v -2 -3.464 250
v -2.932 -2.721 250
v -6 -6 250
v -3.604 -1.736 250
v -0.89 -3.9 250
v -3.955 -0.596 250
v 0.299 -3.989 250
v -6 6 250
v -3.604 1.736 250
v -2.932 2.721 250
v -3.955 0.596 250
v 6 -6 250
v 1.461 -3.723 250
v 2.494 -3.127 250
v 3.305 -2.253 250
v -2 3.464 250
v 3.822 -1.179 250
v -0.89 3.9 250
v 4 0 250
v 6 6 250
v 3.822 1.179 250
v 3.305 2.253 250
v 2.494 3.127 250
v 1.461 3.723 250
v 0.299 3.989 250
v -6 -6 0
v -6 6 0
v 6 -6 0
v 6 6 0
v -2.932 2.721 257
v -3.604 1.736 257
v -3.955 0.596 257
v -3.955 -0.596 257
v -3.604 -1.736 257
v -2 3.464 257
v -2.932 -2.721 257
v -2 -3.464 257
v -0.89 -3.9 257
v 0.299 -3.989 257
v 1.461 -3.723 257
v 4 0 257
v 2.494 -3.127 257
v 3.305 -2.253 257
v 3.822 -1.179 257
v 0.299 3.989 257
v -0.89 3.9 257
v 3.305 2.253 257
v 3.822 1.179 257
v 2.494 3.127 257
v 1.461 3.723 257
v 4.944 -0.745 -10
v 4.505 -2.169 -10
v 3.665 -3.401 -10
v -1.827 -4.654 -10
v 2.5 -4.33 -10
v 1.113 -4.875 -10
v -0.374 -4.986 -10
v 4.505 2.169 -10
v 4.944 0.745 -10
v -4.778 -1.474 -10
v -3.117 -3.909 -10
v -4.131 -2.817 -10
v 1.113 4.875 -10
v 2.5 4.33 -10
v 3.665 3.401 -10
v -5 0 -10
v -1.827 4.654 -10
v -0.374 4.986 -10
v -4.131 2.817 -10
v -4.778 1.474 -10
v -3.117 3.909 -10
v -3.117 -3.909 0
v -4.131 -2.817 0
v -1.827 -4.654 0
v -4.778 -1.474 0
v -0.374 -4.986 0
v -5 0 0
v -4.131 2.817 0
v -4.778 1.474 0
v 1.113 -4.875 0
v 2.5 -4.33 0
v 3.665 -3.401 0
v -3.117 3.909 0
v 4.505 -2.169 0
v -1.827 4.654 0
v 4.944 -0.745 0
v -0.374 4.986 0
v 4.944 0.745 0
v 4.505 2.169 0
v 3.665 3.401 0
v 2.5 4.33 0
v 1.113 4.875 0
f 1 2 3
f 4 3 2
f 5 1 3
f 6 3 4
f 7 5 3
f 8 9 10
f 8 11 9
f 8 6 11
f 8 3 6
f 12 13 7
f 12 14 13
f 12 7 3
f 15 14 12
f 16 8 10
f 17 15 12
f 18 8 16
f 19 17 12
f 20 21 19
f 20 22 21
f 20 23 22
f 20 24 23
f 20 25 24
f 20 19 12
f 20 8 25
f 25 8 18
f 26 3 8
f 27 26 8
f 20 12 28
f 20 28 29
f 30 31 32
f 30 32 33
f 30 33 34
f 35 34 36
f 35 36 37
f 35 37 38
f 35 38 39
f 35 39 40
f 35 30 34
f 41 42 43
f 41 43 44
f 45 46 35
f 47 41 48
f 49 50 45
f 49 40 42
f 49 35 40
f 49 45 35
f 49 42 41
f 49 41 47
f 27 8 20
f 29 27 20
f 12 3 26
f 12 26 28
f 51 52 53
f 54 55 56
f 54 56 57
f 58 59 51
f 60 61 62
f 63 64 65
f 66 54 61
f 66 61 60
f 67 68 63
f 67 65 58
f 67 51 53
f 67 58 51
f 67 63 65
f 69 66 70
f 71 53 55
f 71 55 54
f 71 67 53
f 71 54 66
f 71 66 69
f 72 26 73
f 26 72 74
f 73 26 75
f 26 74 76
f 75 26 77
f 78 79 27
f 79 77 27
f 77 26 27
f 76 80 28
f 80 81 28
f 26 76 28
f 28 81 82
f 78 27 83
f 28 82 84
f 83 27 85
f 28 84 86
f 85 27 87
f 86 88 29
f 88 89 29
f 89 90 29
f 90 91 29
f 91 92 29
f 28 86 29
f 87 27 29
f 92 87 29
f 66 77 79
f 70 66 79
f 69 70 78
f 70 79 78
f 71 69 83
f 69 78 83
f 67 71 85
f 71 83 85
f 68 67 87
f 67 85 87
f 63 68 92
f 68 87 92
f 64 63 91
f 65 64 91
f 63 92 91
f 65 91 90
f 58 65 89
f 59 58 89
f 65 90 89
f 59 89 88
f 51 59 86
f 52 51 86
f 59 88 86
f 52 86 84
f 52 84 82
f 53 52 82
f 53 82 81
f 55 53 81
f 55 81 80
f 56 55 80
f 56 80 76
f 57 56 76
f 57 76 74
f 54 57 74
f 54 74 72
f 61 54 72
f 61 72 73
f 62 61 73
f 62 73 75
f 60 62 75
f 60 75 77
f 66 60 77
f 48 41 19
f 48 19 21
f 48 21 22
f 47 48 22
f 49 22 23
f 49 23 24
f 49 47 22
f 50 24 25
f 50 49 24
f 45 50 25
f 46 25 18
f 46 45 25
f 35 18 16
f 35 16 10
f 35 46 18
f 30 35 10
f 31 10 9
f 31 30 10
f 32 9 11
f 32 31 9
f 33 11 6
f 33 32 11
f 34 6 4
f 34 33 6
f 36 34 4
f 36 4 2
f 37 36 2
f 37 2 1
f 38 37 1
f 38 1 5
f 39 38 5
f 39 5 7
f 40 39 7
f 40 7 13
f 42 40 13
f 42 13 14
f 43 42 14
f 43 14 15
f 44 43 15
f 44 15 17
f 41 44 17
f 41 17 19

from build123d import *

# Parameters (mm, degrees)
EXTRUDE_1_DEPTH     = 250
SKETCH_2_R          = 2.5
EXTRUDE_2_DEPTH     = 10
SKETCH_3_R          = 5
EXTRUDE_3_DEPTH     = 10
SKETCH_4_W          = 2
SKETCH_4_H          = 1.835573614
CUT_EXTRUDE_1_DEPTH = 10
EXTRUDE_START       = -5
SKETCH_6_R          = 2.5
EXTRUDE_5_DEPTH     = 5
SKETCH_9_R          = 2.5
EXTRUDE_7_DEPTH     = 5
SKETCH_10_R         = 2.5
CUT_EXTRUDE_3_DEPTH = 3
CUT_EXTRUDE_START   = -3
SKETCH_11_R         = 2.5
CUT_EXTRUDE_4_DEPTH = 3
EXTRUDE_START_2     = -10
SKETCH_12_R         = 5
EXTRUDE_8_DEPTH     = 10
SKETCH_14_R         = 2.5
EXTRUDE_10_DEPTH    = 1
SKETCH_15_W         = 12
SKETCH_15_H         = 12
EXTRUDE_11_DEPTH    = 250
SKETCH_16_R         = 4
EXTRUDE_12_DEPTH    = 20


with BuildPart() as part:
    # 草图1 → 凸台-拉伸1 (new body)
    with BuildSketch(Plane.XY):
        Polygon((5, 0), (2.5, 4.330127019), (-2.5, 4.330127019), (-5, 0), (-2.5, -4.330127019), (2.5, -4.330127019), align=None)
    extrude(amount=EXTRUDE_1_DEPTH)

    # 草图2 → 凸台-拉伸2 (add)
    with BuildSketch(Plane.XY.offset(250)):
        Circle(SKETCH_2_R)
    extrude(amount=EXTRUDE_2_DEPTH)

    # 草图3 → 凸台-拉伸3 (add)
    with BuildSketch(Plane(origin=(0, 0, 0), x_dir=(-1, 0, 0), z_dir=(0, 0, -1))):
        Circle(SKETCH_3_R)
    extrude(amount=EXTRUDE_3_DEPTH)

    # 草图4 → 切除-拉伸1 (cut)
    with BuildSketch(Plane.XY.offset(260)):
        with Locations((0, 2.417786807)):
            Rectangle(SKETCH_4_W, SKETCH_4_H)
    extrude(amount=-CUT_EXTRUDE_1_DEPTH, mode=Mode.SUBTRACT)

    # 草图6 → 凸台-拉伸5 (add)
    with BuildSketch(Plane.XY.offset(260).offset(EXTRUDE_START)):
        with Locations(Location((0, 0, 0), (0, 0, 113.578178478))):
            Circle(SKETCH_6_R)
    extrude(amount=EXTRUDE_5_DEPTH)

    # 草图9 → 凸台-拉伸7 (add)
    with BuildSketch(Plane(origin=(0, 0, -10), x_dir=(-1, 0, 0), z_dir=(0, 0, -1))):
        with Locations(Location((0, 0, 0), (0, 0, 66.421821522))):
            Circle(SKETCH_9_R)
    extrude(amount=-EXTRUDE_7_DEPTH)

    # 草图10 → 切除-拉伸3 (cut)
    with BuildSketch(Plane(origin=(0, 0, -10), x_dir=(-1, 0, 0), z_dir=(0, 0, -1))):
        with Locations(Location((0, 0, 0), (0, 0, 66.421821522))):
            Circle(SKETCH_10_R)
    extrude(amount=-CUT_EXTRUDE_3_DEPTH, mode=Mode.SUBTRACT)

    # 草图11 → 切除-拉伸4 (cut)
    with BuildSketch(Plane.XY.offset(260).offset(CUT_EXTRUDE_START)):
        with Locations(Location((0, 0, 0), (0, 0, 113.578178478))):
            Circle(SKETCH_11_R)
    extrude(amount=CUT_EXTRUDE_4_DEPTH, mode=Mode.SUBTRACT)

    # 草图12 → 凸台-拉伸8 (add)
    with BuildSketch(Plane(origin=(0, 0, -10), x_dir=(-1, 0, 0), z_dir=(0, 0, -1)).offset(EXTRUDE_START_2)):
        Circle(SKETCH_12_R)
    extrude(amount=EXTRUDE_8_DEPTH)

    # 草图14 → 凸台-拉伸10 (add)
    with BuildSketch(Plane.XY.offset(250)):
        Circle(SKETCH_14_R)
    extrude(amount=EXTRUDE_10_DEPTH)

    # 草图15 → 凸台-拉伸11 (add)
    with BuildSketch(Plane.XY.offset(250)):
        Rectangle(SKETCH_15_W, SKETCH_15_H)
    extrude(amount=-EXTRUDE_11_DEPTH)

    # 草图16 → 凸台-拉伸12 (add)
    with BuildSketch(Plane.XY.offset(257)):
        Circle(SKETCH_16_R)
    extrude(amount=-EXTRUDE_12_DEPTH)


solid = part.part
